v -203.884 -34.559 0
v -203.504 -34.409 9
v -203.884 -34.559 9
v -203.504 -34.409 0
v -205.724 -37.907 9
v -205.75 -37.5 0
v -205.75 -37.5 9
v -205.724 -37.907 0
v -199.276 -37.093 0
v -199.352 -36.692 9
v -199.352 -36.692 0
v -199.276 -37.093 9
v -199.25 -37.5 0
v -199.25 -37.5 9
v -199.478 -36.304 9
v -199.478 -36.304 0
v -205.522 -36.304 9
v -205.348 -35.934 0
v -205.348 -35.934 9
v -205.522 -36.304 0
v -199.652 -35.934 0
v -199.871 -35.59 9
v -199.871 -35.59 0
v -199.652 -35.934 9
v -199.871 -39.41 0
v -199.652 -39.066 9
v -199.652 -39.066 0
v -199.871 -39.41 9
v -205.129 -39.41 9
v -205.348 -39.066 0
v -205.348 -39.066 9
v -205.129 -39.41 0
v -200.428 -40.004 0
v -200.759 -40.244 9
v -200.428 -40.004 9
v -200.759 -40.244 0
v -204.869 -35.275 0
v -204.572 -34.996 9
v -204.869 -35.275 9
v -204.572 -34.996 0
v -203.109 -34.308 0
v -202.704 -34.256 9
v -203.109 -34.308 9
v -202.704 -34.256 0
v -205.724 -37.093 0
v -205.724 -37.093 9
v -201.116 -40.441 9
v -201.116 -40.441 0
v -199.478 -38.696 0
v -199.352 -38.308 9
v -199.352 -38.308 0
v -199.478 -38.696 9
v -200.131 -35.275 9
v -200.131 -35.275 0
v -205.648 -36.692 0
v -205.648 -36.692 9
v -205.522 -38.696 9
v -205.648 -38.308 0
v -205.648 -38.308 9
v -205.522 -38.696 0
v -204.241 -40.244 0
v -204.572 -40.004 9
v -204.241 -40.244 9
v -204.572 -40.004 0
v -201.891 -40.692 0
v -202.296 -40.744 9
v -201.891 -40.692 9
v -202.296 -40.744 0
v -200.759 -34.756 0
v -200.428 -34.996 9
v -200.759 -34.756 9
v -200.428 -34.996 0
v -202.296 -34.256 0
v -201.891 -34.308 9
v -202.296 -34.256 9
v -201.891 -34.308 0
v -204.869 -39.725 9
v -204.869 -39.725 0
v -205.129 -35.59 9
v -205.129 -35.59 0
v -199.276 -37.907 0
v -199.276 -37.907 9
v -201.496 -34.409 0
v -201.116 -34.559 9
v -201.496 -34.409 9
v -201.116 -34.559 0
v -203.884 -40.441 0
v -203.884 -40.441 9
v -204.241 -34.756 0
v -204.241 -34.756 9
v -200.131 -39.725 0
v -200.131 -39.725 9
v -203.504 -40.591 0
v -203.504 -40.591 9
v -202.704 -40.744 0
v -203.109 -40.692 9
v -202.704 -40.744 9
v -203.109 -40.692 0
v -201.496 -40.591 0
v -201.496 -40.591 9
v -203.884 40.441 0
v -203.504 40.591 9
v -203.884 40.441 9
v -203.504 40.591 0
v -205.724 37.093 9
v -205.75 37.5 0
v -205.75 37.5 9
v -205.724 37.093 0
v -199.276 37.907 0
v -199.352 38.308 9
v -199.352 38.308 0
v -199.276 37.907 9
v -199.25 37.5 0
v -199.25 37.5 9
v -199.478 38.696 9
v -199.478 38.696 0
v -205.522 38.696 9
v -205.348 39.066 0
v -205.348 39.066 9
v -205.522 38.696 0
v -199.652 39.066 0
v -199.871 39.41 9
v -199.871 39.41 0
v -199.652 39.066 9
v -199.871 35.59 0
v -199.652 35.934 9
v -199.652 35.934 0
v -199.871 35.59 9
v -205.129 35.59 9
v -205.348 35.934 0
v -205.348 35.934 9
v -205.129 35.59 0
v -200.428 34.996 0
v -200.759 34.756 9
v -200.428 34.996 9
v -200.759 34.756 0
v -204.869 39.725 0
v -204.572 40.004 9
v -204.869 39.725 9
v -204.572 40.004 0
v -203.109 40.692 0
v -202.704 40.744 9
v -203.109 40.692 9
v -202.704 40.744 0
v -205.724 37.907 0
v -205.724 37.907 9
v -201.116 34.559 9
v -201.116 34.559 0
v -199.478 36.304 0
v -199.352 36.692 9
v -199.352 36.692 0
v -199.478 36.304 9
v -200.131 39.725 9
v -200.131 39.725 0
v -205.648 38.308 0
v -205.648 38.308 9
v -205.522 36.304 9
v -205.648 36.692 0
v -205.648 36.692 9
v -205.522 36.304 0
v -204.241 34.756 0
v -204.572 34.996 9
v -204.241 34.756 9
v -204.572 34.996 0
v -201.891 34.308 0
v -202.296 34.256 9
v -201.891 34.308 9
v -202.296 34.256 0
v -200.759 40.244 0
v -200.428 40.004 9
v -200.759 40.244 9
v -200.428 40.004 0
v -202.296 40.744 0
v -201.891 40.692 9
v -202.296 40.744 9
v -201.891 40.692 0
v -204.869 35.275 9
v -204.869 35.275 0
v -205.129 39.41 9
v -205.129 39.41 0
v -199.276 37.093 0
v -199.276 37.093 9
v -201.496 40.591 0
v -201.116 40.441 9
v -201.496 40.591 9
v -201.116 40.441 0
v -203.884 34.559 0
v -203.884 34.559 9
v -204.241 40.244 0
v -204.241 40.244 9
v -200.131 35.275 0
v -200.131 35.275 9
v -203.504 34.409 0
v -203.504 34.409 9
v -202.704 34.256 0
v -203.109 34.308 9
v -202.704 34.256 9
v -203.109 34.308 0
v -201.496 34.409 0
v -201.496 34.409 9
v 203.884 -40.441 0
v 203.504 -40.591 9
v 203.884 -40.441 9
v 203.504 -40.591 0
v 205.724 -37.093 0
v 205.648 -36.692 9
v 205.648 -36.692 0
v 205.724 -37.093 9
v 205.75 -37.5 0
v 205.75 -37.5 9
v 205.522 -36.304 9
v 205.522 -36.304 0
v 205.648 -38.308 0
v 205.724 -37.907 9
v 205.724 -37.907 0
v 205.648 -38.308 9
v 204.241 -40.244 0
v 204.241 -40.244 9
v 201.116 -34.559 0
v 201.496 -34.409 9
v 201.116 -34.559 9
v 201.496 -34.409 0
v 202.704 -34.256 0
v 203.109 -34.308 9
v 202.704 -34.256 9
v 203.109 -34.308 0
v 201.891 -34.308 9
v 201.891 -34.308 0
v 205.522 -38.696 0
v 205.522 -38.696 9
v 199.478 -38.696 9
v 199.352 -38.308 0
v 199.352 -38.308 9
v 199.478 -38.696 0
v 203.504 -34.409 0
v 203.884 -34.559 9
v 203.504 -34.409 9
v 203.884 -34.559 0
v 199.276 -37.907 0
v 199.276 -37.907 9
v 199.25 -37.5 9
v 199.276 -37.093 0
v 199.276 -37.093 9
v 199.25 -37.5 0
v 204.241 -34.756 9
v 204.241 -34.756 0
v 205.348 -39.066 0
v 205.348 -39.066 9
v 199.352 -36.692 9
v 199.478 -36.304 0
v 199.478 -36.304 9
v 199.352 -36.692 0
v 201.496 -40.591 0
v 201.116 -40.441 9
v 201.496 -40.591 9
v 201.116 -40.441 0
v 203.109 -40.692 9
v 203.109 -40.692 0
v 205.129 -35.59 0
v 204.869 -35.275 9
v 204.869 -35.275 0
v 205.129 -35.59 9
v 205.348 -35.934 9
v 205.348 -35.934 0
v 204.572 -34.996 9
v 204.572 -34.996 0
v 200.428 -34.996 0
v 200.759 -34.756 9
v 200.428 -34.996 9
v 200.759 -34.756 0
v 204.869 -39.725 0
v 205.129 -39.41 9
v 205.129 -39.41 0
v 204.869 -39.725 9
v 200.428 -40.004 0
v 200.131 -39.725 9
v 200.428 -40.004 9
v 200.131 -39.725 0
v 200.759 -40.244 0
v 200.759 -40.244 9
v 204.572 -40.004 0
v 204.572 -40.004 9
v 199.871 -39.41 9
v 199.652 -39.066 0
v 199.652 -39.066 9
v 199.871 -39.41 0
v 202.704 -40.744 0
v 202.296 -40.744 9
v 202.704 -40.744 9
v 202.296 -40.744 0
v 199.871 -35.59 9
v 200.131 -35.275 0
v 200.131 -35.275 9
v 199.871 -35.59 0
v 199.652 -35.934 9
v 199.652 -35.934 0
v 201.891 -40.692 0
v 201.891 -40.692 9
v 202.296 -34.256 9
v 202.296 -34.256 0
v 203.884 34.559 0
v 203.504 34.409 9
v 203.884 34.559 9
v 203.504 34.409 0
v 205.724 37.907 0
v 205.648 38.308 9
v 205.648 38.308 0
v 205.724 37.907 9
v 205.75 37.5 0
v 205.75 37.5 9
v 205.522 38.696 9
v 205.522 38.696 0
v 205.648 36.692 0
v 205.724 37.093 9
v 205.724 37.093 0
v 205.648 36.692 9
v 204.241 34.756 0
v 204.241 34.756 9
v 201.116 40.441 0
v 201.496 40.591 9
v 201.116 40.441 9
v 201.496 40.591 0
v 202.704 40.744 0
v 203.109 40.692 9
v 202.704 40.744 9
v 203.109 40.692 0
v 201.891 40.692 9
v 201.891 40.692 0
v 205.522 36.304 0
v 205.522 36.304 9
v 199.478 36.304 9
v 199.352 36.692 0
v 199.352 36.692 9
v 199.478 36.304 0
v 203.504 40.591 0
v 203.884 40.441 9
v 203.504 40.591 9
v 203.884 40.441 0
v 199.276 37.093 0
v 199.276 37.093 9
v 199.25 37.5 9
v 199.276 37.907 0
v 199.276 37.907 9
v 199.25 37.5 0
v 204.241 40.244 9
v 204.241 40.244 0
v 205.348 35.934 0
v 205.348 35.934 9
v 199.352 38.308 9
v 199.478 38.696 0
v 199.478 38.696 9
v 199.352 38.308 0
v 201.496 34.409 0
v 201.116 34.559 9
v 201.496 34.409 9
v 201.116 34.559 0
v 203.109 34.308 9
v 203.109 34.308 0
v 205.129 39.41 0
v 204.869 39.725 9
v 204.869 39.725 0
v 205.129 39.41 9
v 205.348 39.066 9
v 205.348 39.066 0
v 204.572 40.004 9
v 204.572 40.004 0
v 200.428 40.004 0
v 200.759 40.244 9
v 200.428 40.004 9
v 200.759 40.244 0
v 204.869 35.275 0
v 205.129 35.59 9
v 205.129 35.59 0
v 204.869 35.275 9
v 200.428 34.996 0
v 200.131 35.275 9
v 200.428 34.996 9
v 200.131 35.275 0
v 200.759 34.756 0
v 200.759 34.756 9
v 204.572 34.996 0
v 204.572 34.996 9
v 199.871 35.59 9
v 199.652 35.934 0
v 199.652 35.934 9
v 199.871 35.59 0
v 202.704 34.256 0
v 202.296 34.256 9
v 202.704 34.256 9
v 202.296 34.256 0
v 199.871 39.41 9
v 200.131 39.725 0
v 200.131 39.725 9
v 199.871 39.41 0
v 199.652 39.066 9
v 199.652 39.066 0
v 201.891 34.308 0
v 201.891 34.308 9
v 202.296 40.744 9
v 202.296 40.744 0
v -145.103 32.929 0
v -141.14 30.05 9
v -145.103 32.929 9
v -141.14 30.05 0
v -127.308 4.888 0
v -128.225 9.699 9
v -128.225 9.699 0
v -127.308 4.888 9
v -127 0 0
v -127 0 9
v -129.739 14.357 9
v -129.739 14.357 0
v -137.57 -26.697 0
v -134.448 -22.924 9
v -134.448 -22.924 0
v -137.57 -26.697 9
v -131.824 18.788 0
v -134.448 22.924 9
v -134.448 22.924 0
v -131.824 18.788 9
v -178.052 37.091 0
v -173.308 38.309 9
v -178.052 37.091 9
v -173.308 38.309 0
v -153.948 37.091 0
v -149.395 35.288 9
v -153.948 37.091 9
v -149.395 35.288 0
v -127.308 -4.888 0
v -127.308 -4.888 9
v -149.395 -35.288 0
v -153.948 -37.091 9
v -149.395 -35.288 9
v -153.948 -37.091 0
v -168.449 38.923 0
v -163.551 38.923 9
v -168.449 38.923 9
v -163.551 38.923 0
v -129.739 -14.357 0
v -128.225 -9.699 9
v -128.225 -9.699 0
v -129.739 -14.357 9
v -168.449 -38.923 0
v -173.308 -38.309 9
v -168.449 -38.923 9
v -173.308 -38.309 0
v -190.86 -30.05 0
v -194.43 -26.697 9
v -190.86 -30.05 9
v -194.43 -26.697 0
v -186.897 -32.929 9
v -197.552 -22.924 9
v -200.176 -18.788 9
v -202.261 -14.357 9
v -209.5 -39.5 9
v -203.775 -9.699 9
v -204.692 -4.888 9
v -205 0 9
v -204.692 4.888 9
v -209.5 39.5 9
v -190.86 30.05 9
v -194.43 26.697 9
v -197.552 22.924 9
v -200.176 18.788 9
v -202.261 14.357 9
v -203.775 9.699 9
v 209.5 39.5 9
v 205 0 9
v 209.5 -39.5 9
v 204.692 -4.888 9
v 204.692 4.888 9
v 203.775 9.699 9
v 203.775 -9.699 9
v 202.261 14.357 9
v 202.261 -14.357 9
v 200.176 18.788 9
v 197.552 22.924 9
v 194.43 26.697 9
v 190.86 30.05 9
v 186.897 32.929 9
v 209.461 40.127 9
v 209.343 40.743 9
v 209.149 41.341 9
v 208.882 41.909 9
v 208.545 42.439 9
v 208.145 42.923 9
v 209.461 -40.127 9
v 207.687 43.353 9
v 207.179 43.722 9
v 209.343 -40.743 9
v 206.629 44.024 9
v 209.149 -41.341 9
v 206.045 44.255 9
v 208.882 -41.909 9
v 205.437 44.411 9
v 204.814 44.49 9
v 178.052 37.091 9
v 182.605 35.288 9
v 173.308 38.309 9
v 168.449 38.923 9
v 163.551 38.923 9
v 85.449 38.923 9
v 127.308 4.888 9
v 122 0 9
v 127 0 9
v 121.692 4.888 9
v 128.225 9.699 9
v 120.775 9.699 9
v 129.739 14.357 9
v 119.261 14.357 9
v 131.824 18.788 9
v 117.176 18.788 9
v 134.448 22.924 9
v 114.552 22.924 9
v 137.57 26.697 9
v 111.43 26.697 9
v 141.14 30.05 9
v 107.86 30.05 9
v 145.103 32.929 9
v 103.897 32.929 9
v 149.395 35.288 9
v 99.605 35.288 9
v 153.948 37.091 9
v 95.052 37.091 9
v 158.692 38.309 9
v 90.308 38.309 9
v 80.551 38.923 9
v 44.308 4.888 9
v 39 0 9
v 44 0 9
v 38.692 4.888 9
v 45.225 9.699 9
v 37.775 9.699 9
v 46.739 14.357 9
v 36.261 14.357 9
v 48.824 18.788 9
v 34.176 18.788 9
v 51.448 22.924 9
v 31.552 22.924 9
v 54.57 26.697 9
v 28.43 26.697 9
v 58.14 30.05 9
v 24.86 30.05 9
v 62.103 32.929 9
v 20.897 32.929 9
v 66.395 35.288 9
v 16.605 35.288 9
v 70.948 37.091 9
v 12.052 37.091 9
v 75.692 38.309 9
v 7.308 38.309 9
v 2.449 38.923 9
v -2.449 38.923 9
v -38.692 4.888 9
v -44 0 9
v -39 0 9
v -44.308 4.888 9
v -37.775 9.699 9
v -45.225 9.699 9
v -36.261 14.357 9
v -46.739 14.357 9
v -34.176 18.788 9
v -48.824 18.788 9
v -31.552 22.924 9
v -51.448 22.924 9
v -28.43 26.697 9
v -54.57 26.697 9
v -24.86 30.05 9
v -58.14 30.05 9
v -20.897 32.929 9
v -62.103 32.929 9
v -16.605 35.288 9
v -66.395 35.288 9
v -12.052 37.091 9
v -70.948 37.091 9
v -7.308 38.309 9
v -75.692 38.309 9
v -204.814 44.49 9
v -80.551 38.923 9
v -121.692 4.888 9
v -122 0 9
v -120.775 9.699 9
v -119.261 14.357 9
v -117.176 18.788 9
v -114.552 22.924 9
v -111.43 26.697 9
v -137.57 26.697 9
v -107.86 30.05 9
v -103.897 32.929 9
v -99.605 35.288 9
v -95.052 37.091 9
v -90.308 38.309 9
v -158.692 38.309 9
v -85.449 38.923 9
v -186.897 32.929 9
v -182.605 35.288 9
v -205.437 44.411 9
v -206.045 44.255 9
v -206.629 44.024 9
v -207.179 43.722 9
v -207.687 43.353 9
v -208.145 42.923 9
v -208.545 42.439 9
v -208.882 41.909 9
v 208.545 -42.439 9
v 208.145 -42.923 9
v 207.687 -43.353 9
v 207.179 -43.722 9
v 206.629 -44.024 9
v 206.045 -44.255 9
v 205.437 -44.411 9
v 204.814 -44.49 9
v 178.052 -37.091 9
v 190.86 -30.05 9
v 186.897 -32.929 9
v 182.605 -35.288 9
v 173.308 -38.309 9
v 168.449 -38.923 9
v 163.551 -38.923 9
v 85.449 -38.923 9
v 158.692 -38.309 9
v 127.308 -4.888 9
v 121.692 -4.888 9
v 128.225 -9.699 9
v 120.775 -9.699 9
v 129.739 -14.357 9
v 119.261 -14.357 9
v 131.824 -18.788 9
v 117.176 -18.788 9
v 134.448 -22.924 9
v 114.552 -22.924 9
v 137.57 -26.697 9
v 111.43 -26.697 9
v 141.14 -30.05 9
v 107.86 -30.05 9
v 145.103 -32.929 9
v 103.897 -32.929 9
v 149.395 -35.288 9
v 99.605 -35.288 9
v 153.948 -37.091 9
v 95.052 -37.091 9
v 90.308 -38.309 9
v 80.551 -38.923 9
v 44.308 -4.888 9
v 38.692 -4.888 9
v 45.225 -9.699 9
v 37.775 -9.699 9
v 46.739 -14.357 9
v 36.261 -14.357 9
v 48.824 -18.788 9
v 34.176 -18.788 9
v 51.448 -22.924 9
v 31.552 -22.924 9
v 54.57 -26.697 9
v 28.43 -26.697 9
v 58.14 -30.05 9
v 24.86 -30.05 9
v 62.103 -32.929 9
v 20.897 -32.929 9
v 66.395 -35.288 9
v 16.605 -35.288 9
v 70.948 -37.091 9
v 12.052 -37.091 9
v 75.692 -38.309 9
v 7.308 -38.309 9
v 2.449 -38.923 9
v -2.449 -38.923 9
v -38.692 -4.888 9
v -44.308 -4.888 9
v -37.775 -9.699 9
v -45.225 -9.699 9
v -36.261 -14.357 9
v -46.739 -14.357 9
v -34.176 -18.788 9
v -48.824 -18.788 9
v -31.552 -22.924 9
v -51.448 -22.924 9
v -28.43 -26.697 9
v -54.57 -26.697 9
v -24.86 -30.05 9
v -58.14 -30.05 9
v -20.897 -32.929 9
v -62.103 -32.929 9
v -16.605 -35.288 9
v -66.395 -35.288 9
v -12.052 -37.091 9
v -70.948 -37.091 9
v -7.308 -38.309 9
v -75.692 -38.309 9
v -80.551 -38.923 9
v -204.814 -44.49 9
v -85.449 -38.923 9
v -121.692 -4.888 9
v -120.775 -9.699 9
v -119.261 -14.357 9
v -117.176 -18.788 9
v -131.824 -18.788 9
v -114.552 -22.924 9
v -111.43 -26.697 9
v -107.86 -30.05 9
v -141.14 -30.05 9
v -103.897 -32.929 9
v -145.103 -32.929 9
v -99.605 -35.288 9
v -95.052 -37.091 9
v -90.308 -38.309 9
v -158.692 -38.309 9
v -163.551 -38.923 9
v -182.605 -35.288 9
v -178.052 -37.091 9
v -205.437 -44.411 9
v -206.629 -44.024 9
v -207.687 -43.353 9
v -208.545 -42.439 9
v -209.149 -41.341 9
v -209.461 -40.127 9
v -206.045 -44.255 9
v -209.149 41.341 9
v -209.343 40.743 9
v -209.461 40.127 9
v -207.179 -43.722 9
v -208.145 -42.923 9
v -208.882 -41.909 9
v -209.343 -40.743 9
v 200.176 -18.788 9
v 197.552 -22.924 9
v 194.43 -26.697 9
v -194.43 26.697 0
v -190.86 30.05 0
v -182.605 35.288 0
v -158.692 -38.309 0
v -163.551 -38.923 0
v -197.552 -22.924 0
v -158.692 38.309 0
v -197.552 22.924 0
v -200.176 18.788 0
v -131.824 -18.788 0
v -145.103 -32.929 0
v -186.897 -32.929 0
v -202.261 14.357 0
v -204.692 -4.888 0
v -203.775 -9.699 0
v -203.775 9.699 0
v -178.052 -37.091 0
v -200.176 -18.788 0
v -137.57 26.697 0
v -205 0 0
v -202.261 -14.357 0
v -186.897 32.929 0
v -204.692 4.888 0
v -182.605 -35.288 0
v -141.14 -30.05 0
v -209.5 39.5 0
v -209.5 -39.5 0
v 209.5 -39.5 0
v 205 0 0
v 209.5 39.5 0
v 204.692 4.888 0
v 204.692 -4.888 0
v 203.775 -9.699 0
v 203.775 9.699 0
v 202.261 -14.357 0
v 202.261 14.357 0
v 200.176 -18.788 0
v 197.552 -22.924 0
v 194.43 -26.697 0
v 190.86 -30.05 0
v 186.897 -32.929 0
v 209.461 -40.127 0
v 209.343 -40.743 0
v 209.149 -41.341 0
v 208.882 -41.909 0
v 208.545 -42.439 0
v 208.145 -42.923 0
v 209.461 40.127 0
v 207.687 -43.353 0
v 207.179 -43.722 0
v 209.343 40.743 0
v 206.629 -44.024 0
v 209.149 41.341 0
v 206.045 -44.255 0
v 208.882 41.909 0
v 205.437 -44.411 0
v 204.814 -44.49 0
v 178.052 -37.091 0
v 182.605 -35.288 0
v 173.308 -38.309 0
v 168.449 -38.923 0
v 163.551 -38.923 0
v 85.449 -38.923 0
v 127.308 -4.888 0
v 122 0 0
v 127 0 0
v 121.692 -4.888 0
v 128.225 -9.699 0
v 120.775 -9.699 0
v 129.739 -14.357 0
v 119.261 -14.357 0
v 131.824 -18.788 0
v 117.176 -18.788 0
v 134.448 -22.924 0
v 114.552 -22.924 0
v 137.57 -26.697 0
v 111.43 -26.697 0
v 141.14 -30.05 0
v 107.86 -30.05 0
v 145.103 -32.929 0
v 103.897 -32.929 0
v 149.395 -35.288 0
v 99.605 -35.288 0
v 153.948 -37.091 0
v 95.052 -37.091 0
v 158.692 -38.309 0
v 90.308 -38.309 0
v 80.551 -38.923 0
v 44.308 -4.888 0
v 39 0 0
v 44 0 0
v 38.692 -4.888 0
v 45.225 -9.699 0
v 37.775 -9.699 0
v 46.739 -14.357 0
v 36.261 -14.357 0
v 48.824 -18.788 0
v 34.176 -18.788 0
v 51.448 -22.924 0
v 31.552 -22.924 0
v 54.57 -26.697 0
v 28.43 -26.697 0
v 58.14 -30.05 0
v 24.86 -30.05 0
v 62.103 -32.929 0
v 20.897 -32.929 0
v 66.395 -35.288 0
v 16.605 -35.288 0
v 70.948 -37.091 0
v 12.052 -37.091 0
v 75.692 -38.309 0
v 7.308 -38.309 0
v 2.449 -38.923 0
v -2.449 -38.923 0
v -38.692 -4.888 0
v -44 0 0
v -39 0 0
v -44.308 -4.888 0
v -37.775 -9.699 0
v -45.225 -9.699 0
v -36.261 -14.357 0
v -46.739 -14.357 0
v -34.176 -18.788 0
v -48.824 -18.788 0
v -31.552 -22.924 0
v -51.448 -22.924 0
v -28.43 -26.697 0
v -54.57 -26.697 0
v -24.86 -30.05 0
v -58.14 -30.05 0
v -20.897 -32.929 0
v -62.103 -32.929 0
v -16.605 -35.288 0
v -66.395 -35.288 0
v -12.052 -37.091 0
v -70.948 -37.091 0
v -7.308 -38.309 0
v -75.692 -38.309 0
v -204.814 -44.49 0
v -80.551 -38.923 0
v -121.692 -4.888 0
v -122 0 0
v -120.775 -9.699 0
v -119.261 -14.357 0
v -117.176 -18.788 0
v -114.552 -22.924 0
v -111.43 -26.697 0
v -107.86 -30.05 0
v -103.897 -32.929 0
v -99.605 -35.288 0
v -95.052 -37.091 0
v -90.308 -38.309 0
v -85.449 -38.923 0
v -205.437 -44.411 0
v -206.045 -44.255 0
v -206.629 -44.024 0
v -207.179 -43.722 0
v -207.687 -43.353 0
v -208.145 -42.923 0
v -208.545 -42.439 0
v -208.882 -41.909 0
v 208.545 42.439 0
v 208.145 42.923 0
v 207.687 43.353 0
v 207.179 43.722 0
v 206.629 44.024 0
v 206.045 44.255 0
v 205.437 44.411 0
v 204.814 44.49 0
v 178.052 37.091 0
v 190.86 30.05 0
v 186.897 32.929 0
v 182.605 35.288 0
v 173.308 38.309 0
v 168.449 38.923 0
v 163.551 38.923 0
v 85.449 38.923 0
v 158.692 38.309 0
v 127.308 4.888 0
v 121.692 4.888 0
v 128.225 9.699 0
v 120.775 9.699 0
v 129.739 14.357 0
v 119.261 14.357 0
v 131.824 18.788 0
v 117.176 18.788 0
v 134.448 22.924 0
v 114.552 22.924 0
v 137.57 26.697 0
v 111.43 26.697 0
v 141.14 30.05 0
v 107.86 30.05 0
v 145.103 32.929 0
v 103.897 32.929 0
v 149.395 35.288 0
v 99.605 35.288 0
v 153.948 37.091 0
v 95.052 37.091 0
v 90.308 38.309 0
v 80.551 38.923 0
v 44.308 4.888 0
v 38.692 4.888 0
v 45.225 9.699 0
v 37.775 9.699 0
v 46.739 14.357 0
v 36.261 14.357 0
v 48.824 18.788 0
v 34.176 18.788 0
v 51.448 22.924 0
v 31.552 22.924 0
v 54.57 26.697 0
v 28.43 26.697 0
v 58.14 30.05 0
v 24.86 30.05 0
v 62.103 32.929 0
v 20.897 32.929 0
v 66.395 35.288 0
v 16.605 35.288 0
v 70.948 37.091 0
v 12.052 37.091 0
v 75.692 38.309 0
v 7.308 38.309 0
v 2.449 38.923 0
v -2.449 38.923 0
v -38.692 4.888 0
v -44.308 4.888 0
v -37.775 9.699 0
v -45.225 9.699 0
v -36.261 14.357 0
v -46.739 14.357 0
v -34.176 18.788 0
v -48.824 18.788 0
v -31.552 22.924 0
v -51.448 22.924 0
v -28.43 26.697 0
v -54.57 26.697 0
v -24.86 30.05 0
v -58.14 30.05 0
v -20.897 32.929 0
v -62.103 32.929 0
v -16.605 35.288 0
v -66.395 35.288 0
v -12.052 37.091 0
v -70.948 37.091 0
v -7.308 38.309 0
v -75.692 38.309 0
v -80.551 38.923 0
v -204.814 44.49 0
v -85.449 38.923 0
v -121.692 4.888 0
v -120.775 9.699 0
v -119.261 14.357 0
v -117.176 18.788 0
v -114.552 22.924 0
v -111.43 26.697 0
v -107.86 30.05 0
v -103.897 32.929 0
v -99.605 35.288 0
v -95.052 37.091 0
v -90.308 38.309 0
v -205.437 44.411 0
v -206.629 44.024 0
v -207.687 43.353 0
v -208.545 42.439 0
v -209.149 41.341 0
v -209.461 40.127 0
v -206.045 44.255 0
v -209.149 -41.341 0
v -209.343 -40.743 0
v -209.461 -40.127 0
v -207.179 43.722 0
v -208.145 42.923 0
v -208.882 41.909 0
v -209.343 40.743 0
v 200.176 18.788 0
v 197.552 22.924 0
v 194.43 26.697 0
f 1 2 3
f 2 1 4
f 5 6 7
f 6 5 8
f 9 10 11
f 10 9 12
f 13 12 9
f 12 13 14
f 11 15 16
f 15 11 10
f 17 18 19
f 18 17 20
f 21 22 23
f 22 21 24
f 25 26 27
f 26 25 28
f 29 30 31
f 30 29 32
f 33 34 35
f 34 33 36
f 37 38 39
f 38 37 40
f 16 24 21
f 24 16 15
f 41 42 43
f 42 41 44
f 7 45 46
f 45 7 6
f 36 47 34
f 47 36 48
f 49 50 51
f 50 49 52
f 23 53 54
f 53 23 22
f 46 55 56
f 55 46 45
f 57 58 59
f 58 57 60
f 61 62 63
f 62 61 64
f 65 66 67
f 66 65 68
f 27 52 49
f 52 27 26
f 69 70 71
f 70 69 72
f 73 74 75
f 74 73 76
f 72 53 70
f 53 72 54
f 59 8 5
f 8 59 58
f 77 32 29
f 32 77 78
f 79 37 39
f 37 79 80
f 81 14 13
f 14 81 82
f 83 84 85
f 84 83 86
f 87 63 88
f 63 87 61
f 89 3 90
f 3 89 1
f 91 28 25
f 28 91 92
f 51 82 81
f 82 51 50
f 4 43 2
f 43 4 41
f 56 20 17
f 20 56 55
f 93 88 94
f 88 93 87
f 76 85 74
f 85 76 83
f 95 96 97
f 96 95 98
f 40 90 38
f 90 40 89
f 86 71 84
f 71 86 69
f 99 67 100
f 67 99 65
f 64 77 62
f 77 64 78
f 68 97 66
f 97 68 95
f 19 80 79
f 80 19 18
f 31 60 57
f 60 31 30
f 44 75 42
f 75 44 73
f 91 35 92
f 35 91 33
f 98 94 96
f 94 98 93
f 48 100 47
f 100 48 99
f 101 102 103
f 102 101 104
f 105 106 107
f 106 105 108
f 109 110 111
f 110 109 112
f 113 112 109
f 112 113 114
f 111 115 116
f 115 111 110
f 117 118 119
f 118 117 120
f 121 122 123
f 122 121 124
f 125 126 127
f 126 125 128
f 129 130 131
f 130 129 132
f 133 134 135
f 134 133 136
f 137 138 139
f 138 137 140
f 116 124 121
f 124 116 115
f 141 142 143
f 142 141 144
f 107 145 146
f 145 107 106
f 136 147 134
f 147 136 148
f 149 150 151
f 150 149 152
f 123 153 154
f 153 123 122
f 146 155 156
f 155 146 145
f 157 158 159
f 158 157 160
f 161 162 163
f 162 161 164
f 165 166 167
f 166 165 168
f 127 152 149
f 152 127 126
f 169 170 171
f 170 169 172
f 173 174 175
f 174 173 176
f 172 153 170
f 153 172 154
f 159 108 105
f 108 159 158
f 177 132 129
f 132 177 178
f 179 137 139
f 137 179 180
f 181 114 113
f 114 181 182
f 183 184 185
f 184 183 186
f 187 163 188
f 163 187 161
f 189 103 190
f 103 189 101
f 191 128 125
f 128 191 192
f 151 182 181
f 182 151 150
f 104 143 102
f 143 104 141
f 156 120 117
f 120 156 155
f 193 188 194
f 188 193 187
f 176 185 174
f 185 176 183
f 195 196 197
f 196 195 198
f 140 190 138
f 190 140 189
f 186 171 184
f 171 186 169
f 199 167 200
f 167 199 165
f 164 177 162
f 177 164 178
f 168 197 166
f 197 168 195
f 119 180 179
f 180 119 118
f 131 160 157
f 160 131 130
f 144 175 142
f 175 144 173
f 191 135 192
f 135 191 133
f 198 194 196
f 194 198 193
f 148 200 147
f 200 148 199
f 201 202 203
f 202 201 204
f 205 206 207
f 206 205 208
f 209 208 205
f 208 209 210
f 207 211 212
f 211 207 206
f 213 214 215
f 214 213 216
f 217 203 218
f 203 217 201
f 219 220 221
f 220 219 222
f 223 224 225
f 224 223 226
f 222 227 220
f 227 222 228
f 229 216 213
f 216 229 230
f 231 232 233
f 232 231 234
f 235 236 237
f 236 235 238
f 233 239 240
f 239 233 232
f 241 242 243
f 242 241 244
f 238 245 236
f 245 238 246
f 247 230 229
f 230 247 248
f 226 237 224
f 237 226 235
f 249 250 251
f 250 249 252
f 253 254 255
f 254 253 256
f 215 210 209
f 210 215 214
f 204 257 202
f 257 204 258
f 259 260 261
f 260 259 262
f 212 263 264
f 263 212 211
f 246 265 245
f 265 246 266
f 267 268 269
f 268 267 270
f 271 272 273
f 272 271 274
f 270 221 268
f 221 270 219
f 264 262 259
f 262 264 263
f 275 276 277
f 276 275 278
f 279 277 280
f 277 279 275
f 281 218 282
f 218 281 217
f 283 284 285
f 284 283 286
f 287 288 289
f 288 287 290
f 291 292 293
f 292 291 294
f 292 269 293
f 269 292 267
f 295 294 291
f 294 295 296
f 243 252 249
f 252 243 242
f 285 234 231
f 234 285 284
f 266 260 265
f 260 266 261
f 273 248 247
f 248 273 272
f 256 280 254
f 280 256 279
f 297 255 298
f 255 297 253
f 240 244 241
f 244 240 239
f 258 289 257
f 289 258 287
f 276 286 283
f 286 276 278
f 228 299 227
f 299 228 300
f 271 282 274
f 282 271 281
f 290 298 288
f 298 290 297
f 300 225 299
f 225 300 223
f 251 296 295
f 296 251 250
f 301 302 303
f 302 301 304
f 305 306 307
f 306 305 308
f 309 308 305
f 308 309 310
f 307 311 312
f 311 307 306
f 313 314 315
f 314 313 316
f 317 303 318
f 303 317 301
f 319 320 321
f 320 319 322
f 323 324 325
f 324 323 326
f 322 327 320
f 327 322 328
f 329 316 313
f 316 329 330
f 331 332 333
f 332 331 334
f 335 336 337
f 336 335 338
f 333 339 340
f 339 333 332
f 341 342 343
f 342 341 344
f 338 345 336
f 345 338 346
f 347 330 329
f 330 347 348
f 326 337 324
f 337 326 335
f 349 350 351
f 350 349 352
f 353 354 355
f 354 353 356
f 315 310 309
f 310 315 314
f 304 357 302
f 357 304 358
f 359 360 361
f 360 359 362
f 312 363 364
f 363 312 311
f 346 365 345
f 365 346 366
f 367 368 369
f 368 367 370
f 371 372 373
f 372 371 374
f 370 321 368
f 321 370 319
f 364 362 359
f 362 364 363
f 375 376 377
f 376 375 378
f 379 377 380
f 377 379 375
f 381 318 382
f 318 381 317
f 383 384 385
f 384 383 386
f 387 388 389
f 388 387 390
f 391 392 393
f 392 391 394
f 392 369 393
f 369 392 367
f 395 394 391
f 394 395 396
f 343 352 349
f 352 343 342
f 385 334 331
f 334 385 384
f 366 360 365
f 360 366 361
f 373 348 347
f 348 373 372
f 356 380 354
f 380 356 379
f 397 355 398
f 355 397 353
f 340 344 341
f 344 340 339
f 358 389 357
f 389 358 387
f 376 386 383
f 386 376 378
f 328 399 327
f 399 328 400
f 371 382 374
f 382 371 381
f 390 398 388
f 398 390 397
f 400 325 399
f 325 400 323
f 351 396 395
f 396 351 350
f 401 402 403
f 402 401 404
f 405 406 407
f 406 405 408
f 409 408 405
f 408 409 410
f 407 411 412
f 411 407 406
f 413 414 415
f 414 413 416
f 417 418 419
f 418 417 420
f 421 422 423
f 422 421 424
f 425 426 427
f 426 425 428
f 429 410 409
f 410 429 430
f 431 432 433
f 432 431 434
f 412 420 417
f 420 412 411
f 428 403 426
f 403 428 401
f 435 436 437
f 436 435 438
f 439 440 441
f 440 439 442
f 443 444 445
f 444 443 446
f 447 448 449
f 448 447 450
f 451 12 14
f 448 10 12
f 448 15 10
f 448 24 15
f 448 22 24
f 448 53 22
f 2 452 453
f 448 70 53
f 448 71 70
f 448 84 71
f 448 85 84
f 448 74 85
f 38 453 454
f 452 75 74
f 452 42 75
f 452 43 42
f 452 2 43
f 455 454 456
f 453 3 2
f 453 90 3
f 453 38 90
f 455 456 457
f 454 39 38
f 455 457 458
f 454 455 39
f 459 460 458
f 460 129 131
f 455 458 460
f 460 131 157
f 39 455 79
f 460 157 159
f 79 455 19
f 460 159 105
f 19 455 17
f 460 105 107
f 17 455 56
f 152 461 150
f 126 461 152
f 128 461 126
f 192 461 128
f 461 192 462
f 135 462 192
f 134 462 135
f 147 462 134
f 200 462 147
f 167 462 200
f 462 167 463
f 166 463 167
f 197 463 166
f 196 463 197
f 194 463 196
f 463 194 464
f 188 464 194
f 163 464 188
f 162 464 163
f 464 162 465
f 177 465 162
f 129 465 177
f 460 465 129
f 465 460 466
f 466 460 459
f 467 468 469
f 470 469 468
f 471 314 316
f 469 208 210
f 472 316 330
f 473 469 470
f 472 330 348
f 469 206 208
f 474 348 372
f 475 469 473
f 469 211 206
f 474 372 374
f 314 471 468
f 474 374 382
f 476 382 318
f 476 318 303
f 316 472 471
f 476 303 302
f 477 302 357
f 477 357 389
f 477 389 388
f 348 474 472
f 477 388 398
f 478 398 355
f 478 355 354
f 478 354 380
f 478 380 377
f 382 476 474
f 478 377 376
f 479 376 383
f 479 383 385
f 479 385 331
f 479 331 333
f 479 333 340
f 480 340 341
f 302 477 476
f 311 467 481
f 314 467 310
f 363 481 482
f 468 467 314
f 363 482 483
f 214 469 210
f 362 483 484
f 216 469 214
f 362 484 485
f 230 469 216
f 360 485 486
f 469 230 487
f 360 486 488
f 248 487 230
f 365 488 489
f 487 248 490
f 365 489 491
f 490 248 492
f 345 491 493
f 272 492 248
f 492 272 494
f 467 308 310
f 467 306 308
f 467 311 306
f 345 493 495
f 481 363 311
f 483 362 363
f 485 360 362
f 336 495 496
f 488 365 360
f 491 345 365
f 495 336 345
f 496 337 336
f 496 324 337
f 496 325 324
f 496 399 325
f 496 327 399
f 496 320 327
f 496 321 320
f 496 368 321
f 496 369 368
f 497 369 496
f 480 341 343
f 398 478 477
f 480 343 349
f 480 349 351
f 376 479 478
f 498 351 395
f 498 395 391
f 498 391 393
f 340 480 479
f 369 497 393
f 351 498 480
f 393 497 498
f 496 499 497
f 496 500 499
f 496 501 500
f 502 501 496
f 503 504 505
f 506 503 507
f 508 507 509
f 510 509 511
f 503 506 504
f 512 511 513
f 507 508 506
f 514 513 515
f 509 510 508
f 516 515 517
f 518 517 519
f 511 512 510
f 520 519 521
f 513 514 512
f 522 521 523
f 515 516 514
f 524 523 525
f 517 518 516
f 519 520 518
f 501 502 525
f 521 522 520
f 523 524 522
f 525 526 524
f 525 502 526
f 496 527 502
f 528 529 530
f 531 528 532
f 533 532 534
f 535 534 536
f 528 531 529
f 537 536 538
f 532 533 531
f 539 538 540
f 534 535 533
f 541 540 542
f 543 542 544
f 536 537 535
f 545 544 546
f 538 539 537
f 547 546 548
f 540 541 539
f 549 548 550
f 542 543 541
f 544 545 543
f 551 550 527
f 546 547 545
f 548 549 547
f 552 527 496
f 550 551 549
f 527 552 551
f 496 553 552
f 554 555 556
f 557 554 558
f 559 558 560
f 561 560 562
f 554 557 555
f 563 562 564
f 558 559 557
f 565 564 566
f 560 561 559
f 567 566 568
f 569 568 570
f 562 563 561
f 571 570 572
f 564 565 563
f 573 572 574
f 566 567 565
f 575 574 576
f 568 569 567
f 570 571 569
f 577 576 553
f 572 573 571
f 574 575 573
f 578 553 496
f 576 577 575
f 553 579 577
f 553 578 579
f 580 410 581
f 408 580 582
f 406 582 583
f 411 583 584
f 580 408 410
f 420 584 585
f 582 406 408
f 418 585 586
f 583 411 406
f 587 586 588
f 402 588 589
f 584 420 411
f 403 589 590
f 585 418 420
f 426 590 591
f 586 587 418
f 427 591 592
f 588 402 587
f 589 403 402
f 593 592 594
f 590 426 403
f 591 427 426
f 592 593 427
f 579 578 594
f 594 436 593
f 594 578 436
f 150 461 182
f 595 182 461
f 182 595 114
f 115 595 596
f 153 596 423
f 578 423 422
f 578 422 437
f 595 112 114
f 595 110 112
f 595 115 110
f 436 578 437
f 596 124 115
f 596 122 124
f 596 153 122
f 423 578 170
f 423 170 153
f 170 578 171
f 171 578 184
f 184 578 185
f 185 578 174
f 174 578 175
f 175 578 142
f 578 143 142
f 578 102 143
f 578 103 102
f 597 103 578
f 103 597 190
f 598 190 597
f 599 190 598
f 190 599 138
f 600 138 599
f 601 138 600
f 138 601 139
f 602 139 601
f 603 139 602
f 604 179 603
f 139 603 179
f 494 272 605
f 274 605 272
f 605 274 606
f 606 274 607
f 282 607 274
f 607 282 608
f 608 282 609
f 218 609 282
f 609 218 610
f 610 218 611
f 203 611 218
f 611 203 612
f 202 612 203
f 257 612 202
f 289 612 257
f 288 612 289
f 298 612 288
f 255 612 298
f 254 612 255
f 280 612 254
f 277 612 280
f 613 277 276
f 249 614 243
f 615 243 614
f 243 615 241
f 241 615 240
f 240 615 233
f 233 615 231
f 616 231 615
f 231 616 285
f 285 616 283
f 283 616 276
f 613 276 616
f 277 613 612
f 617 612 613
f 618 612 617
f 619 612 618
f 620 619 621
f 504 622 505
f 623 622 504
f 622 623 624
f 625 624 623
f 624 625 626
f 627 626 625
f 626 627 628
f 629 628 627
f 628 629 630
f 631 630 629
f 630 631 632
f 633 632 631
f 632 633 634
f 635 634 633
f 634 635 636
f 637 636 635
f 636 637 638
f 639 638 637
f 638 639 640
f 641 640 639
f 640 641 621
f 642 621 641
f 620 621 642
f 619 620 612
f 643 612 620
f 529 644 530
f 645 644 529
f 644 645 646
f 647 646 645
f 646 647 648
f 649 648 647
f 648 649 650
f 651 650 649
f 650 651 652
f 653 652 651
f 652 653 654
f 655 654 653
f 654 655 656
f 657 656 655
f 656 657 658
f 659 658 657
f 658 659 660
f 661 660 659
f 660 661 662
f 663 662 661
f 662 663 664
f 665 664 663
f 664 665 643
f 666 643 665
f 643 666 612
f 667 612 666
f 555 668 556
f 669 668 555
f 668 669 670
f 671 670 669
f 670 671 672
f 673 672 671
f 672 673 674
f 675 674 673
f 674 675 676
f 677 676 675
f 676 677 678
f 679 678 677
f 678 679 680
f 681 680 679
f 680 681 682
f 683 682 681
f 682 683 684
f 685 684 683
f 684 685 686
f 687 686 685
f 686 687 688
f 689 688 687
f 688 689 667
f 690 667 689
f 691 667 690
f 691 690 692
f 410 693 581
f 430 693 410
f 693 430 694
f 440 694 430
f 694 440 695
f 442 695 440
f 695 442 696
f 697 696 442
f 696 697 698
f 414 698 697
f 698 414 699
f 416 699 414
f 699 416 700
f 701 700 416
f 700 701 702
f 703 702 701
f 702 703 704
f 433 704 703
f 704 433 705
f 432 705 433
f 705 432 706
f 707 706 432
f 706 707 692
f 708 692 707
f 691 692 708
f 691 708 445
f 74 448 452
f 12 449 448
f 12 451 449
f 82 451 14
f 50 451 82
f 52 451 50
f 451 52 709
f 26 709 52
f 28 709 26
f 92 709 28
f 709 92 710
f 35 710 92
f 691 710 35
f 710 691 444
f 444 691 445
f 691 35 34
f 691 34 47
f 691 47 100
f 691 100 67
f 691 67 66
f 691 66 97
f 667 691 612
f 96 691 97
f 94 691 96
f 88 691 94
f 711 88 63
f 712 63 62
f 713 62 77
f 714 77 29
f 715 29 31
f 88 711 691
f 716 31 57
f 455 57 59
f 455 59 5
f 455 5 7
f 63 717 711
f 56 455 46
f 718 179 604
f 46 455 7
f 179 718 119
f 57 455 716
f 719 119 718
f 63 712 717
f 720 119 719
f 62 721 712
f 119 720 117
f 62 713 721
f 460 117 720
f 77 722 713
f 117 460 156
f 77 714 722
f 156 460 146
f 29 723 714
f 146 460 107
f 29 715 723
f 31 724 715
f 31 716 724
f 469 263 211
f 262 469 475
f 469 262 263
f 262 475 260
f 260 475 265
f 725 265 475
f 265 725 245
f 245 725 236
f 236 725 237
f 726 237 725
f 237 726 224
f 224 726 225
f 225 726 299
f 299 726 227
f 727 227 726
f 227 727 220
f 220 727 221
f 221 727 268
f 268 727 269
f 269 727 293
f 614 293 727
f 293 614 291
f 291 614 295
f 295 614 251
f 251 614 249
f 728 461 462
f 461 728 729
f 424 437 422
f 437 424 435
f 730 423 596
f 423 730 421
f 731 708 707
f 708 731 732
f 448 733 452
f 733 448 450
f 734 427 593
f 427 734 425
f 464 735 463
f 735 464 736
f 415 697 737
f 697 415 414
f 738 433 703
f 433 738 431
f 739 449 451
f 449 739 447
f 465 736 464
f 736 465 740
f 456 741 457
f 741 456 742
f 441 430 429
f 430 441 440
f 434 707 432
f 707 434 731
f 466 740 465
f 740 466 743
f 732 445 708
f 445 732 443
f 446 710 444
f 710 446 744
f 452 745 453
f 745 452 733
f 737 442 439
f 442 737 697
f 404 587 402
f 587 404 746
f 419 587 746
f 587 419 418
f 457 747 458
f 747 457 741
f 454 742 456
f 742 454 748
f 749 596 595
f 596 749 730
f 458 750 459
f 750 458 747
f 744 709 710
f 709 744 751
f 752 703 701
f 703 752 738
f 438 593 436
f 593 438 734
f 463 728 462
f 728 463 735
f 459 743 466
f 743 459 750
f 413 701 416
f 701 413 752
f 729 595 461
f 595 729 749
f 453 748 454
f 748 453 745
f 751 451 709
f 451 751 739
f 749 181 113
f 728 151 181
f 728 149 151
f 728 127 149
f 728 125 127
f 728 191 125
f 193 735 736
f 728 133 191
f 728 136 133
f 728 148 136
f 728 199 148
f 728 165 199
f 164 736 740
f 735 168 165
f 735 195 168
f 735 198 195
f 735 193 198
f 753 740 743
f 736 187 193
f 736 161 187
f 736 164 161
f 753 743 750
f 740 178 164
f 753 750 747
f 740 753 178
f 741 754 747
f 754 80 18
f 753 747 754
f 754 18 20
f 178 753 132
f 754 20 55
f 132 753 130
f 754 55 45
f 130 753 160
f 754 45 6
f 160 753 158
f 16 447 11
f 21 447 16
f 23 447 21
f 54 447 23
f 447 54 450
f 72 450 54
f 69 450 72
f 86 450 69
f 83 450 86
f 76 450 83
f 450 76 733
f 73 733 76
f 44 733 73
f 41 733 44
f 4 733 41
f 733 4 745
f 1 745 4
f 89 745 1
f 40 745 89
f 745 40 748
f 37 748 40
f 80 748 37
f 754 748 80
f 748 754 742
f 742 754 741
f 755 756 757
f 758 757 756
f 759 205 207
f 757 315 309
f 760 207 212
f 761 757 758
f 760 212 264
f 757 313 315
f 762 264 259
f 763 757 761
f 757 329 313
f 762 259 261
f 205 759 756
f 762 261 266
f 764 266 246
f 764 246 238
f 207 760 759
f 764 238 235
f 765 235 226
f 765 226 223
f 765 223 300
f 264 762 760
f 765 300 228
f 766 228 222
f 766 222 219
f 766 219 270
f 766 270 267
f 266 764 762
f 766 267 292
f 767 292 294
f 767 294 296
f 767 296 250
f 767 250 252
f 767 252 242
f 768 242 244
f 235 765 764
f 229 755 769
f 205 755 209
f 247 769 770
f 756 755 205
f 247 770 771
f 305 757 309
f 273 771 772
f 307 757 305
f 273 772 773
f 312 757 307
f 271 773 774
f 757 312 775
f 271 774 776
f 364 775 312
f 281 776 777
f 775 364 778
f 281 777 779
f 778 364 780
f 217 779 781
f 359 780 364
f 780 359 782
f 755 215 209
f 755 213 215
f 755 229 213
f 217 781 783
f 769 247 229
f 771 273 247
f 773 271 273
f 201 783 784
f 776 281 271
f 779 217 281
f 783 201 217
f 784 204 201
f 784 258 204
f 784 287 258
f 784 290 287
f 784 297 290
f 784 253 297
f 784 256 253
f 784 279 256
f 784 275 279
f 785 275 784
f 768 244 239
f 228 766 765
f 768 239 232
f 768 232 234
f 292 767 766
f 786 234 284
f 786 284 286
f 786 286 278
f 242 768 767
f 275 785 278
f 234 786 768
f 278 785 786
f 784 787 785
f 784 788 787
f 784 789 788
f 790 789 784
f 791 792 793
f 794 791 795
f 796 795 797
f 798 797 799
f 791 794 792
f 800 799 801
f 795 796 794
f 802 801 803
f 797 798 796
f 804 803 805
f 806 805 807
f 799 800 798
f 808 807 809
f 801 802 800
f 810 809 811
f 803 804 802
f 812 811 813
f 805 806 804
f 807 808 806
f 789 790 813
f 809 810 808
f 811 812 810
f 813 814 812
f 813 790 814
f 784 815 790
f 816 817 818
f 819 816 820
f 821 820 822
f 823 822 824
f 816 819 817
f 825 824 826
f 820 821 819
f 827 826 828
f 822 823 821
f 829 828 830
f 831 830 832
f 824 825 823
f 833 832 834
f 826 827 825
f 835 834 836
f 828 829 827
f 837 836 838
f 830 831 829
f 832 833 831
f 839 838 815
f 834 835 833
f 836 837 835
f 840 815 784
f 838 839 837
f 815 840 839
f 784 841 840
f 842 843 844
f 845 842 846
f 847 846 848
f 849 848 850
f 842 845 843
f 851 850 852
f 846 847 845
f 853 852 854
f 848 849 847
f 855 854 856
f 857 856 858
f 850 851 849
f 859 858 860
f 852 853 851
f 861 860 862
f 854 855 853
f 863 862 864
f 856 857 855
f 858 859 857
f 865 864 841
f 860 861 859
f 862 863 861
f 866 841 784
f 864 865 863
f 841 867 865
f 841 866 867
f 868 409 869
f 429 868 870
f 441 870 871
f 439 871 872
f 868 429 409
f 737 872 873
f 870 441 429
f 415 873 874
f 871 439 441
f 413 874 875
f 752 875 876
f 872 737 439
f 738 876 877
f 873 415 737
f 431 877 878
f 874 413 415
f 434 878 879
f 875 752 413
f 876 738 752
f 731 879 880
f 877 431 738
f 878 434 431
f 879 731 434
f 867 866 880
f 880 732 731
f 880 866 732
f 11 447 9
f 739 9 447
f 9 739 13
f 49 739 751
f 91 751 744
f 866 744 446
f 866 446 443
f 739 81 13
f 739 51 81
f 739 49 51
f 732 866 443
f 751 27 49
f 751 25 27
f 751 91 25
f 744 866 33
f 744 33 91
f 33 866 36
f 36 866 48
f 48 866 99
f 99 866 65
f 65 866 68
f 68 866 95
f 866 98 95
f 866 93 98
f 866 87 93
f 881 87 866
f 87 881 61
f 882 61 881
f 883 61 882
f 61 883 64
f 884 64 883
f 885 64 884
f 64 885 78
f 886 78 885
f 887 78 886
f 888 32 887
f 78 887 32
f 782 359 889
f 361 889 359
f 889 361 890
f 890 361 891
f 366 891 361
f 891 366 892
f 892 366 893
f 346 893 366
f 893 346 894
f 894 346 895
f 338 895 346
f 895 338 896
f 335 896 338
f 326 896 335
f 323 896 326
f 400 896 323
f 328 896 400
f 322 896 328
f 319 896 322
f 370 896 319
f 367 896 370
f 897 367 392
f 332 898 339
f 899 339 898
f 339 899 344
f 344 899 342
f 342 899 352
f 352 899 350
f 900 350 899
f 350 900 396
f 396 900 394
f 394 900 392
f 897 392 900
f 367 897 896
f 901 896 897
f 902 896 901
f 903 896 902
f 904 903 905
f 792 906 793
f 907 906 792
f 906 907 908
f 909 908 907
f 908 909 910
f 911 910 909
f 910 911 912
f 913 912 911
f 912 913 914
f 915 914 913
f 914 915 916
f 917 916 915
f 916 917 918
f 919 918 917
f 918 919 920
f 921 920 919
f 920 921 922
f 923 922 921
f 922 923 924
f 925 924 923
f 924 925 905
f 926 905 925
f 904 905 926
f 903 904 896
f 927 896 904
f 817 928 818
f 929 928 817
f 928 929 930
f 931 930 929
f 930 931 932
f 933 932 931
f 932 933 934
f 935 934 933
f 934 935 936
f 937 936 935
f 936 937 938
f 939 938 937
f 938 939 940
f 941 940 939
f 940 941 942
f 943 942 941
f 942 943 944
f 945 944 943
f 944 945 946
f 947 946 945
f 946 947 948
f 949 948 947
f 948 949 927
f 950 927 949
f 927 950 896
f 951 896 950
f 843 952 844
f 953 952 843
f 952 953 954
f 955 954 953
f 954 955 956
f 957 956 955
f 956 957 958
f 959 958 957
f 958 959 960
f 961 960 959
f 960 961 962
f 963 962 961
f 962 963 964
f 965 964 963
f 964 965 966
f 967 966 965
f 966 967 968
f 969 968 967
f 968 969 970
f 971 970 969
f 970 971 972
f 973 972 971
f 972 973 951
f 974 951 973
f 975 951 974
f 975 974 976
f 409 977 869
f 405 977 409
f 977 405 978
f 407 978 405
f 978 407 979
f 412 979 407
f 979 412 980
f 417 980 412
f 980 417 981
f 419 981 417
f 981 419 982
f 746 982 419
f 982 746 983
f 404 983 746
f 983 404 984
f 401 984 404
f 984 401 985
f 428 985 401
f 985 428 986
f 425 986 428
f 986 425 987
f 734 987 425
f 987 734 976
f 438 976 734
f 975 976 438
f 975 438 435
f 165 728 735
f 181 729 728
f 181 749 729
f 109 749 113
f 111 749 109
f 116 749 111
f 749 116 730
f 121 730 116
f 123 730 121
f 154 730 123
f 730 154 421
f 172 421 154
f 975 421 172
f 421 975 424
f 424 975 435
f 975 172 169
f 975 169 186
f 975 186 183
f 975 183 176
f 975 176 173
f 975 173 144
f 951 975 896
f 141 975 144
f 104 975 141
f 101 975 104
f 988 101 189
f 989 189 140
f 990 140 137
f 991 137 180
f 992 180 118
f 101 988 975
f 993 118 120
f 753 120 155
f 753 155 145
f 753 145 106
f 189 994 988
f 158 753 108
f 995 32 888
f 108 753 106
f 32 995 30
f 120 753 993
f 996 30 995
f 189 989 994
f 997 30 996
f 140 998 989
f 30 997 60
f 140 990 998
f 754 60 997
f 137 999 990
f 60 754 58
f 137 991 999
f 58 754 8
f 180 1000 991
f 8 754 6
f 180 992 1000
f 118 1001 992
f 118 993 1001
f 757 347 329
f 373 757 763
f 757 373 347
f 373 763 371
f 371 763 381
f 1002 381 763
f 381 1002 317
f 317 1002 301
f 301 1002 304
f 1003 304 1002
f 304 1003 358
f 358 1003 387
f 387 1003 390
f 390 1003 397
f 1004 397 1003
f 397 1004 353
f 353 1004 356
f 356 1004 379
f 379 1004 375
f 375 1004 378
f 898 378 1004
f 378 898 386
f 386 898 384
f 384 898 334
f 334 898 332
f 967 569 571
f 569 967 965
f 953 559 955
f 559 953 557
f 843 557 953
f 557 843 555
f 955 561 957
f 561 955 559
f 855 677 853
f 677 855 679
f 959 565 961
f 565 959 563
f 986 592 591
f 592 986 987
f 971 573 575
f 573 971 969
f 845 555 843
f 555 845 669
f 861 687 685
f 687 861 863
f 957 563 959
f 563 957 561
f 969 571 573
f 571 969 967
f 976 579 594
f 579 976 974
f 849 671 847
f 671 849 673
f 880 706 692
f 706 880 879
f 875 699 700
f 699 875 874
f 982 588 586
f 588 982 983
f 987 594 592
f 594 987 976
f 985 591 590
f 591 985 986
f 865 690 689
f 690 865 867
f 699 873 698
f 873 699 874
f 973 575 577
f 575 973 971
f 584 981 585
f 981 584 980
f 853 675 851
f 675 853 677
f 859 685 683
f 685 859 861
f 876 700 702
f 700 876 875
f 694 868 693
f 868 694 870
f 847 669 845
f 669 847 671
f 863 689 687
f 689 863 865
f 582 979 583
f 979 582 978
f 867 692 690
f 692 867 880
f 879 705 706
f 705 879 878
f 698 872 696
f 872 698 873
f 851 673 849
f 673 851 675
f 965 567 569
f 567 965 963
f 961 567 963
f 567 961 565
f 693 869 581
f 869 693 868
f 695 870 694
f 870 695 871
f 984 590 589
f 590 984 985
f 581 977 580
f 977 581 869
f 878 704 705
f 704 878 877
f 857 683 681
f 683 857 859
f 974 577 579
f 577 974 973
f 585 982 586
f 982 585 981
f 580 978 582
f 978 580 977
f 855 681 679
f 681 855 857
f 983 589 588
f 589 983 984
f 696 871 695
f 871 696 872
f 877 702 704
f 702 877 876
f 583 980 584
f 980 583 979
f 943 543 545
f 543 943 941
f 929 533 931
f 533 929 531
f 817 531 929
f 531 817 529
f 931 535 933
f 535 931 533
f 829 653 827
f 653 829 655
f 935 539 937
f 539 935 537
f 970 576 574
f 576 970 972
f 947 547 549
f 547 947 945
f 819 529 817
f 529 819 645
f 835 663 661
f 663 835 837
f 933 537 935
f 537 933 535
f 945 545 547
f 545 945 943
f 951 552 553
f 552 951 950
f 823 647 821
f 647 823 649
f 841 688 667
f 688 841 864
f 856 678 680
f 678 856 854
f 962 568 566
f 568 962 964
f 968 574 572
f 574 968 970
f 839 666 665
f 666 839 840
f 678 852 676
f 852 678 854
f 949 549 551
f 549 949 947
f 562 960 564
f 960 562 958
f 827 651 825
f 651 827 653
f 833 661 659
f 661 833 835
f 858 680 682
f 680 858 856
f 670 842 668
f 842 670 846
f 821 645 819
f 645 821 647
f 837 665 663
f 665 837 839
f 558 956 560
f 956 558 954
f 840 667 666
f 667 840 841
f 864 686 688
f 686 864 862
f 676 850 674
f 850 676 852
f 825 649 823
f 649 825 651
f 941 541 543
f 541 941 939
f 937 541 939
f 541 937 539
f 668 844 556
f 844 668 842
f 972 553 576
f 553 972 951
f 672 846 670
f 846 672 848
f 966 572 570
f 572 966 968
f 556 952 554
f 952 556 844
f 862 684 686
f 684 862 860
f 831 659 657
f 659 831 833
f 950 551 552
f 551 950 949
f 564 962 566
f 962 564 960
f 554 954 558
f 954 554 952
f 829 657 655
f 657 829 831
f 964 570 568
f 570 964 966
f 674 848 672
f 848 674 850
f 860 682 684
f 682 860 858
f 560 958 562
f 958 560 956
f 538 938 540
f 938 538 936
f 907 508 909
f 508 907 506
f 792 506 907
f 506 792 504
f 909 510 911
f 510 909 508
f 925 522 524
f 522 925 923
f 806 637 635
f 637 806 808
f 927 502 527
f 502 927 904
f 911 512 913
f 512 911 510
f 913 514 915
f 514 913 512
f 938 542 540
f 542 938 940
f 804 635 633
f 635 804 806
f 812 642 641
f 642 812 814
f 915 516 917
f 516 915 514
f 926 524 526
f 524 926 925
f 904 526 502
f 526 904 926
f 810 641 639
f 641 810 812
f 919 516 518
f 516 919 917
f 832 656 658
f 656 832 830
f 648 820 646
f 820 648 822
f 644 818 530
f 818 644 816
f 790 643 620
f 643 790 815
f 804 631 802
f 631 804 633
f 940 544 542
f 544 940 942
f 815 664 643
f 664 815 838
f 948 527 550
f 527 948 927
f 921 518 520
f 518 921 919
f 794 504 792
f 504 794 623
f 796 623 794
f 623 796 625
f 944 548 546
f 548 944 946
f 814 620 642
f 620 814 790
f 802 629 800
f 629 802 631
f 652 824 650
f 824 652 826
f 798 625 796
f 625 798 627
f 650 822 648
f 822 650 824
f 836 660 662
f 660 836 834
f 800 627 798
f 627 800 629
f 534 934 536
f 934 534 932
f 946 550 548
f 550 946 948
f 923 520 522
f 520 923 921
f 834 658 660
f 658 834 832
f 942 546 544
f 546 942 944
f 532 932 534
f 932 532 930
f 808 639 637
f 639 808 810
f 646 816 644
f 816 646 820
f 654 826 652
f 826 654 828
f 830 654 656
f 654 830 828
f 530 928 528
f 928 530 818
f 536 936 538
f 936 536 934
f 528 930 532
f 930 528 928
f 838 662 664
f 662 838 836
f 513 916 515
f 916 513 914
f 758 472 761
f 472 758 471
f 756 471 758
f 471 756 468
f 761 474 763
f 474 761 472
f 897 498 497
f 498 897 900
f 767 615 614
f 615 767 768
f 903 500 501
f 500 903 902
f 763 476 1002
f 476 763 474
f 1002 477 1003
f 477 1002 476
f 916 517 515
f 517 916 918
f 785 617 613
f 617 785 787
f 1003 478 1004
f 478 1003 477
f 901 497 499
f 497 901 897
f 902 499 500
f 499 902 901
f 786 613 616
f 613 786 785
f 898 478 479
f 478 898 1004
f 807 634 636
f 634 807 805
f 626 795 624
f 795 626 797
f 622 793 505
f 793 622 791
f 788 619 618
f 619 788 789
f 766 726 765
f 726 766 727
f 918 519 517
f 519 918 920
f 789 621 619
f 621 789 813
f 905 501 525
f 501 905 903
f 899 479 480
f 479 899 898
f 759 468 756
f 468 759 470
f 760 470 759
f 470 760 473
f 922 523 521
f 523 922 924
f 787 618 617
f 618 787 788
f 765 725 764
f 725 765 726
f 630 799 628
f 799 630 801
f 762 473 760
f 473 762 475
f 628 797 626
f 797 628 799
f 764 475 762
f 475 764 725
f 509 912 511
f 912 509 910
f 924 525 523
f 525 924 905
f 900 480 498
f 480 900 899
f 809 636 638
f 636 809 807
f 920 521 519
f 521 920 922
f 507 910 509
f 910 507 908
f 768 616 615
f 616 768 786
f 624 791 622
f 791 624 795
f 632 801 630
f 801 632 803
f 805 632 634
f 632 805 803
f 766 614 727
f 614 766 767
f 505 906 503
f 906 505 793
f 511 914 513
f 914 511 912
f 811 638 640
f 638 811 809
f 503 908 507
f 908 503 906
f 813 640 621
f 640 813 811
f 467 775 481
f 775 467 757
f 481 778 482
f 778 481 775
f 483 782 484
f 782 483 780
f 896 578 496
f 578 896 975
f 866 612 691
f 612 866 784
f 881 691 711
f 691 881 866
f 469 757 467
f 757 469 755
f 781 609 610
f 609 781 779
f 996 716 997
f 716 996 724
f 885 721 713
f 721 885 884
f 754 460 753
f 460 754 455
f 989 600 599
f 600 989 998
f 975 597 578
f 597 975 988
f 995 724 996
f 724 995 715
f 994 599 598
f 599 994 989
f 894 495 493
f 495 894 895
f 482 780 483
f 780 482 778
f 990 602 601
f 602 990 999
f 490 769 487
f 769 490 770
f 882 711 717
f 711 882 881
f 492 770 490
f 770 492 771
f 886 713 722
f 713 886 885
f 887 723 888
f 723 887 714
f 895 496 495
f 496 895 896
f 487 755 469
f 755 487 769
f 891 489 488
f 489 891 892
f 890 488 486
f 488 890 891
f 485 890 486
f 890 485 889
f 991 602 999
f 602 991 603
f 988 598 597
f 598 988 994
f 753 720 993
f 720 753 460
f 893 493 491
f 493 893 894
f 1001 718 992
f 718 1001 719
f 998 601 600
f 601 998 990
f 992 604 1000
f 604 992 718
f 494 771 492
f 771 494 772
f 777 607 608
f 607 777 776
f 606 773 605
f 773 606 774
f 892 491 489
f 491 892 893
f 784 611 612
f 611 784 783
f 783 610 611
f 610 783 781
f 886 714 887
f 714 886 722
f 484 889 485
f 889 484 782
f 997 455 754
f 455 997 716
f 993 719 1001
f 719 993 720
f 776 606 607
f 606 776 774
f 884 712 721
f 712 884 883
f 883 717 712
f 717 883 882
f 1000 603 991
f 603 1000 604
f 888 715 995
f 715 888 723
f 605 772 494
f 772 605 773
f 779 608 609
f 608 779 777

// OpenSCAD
$fn = 50;


difference() {
	union() {
		hull() {
			translate(v = [-204.5000000000, 39.5000000000, 0]) {
				cylinder(h = 9, r = 5);
			}
			translate(v = [204.5000000000, 39.5000000000, 0]) {
				cylinder(h = 9, r = 5);
			}
			translate(v = [-204.5000000000, -39.5000000000, 0]) {
				cylinder(h = 9, r = 5);
			}
			translate(v = [204.5000000000, -39.5000000000, 0]) {
				cylinder(h = 9, r = 5);
			}
		}
	}
	union() {
		#translate(v = [-202.5000000000, -37.5000000000, -100.0000000000]) {
			cylinder(h = 200, r = 3.2500000000);
		}
		#translate(v = [-202.5000000000, 37.5000000000, -100.0000000000]) {
			cylinder(h = 200, r = 3.2500000000);
		}
		#translate(v = [202.5000000000, -37.5000000000, -100.0000000000]) {
			cylinder(h = 200, r = 3.2500000000);
		}
		#translate(v = [202.5000000000, 37.5000000000, -100.0000000000]) {
			cylinder(h = 200, r = 3.2500000000);
		}
		#translate(v = [-166.0000000000, 0, 0]) {
			cylinder(h = 9, r = 39.0000000000);
		}
		#translate(v = [-83.0000000000, 0, 0]) {
			cylinder(h = 9, r = 39.0000000000);
		}
		#cylinder(h = 9, r = 39.0000000000);
		#translate(v = [83.0000000000, 0, 0]) {
			cylinder(h = 9, r = 39.0000000000);
		}
		#translate(v = [166.0000000000, 0, 0]) {
			cylinder(h = 9, r = 39.0000000000);
		}
	}
}
